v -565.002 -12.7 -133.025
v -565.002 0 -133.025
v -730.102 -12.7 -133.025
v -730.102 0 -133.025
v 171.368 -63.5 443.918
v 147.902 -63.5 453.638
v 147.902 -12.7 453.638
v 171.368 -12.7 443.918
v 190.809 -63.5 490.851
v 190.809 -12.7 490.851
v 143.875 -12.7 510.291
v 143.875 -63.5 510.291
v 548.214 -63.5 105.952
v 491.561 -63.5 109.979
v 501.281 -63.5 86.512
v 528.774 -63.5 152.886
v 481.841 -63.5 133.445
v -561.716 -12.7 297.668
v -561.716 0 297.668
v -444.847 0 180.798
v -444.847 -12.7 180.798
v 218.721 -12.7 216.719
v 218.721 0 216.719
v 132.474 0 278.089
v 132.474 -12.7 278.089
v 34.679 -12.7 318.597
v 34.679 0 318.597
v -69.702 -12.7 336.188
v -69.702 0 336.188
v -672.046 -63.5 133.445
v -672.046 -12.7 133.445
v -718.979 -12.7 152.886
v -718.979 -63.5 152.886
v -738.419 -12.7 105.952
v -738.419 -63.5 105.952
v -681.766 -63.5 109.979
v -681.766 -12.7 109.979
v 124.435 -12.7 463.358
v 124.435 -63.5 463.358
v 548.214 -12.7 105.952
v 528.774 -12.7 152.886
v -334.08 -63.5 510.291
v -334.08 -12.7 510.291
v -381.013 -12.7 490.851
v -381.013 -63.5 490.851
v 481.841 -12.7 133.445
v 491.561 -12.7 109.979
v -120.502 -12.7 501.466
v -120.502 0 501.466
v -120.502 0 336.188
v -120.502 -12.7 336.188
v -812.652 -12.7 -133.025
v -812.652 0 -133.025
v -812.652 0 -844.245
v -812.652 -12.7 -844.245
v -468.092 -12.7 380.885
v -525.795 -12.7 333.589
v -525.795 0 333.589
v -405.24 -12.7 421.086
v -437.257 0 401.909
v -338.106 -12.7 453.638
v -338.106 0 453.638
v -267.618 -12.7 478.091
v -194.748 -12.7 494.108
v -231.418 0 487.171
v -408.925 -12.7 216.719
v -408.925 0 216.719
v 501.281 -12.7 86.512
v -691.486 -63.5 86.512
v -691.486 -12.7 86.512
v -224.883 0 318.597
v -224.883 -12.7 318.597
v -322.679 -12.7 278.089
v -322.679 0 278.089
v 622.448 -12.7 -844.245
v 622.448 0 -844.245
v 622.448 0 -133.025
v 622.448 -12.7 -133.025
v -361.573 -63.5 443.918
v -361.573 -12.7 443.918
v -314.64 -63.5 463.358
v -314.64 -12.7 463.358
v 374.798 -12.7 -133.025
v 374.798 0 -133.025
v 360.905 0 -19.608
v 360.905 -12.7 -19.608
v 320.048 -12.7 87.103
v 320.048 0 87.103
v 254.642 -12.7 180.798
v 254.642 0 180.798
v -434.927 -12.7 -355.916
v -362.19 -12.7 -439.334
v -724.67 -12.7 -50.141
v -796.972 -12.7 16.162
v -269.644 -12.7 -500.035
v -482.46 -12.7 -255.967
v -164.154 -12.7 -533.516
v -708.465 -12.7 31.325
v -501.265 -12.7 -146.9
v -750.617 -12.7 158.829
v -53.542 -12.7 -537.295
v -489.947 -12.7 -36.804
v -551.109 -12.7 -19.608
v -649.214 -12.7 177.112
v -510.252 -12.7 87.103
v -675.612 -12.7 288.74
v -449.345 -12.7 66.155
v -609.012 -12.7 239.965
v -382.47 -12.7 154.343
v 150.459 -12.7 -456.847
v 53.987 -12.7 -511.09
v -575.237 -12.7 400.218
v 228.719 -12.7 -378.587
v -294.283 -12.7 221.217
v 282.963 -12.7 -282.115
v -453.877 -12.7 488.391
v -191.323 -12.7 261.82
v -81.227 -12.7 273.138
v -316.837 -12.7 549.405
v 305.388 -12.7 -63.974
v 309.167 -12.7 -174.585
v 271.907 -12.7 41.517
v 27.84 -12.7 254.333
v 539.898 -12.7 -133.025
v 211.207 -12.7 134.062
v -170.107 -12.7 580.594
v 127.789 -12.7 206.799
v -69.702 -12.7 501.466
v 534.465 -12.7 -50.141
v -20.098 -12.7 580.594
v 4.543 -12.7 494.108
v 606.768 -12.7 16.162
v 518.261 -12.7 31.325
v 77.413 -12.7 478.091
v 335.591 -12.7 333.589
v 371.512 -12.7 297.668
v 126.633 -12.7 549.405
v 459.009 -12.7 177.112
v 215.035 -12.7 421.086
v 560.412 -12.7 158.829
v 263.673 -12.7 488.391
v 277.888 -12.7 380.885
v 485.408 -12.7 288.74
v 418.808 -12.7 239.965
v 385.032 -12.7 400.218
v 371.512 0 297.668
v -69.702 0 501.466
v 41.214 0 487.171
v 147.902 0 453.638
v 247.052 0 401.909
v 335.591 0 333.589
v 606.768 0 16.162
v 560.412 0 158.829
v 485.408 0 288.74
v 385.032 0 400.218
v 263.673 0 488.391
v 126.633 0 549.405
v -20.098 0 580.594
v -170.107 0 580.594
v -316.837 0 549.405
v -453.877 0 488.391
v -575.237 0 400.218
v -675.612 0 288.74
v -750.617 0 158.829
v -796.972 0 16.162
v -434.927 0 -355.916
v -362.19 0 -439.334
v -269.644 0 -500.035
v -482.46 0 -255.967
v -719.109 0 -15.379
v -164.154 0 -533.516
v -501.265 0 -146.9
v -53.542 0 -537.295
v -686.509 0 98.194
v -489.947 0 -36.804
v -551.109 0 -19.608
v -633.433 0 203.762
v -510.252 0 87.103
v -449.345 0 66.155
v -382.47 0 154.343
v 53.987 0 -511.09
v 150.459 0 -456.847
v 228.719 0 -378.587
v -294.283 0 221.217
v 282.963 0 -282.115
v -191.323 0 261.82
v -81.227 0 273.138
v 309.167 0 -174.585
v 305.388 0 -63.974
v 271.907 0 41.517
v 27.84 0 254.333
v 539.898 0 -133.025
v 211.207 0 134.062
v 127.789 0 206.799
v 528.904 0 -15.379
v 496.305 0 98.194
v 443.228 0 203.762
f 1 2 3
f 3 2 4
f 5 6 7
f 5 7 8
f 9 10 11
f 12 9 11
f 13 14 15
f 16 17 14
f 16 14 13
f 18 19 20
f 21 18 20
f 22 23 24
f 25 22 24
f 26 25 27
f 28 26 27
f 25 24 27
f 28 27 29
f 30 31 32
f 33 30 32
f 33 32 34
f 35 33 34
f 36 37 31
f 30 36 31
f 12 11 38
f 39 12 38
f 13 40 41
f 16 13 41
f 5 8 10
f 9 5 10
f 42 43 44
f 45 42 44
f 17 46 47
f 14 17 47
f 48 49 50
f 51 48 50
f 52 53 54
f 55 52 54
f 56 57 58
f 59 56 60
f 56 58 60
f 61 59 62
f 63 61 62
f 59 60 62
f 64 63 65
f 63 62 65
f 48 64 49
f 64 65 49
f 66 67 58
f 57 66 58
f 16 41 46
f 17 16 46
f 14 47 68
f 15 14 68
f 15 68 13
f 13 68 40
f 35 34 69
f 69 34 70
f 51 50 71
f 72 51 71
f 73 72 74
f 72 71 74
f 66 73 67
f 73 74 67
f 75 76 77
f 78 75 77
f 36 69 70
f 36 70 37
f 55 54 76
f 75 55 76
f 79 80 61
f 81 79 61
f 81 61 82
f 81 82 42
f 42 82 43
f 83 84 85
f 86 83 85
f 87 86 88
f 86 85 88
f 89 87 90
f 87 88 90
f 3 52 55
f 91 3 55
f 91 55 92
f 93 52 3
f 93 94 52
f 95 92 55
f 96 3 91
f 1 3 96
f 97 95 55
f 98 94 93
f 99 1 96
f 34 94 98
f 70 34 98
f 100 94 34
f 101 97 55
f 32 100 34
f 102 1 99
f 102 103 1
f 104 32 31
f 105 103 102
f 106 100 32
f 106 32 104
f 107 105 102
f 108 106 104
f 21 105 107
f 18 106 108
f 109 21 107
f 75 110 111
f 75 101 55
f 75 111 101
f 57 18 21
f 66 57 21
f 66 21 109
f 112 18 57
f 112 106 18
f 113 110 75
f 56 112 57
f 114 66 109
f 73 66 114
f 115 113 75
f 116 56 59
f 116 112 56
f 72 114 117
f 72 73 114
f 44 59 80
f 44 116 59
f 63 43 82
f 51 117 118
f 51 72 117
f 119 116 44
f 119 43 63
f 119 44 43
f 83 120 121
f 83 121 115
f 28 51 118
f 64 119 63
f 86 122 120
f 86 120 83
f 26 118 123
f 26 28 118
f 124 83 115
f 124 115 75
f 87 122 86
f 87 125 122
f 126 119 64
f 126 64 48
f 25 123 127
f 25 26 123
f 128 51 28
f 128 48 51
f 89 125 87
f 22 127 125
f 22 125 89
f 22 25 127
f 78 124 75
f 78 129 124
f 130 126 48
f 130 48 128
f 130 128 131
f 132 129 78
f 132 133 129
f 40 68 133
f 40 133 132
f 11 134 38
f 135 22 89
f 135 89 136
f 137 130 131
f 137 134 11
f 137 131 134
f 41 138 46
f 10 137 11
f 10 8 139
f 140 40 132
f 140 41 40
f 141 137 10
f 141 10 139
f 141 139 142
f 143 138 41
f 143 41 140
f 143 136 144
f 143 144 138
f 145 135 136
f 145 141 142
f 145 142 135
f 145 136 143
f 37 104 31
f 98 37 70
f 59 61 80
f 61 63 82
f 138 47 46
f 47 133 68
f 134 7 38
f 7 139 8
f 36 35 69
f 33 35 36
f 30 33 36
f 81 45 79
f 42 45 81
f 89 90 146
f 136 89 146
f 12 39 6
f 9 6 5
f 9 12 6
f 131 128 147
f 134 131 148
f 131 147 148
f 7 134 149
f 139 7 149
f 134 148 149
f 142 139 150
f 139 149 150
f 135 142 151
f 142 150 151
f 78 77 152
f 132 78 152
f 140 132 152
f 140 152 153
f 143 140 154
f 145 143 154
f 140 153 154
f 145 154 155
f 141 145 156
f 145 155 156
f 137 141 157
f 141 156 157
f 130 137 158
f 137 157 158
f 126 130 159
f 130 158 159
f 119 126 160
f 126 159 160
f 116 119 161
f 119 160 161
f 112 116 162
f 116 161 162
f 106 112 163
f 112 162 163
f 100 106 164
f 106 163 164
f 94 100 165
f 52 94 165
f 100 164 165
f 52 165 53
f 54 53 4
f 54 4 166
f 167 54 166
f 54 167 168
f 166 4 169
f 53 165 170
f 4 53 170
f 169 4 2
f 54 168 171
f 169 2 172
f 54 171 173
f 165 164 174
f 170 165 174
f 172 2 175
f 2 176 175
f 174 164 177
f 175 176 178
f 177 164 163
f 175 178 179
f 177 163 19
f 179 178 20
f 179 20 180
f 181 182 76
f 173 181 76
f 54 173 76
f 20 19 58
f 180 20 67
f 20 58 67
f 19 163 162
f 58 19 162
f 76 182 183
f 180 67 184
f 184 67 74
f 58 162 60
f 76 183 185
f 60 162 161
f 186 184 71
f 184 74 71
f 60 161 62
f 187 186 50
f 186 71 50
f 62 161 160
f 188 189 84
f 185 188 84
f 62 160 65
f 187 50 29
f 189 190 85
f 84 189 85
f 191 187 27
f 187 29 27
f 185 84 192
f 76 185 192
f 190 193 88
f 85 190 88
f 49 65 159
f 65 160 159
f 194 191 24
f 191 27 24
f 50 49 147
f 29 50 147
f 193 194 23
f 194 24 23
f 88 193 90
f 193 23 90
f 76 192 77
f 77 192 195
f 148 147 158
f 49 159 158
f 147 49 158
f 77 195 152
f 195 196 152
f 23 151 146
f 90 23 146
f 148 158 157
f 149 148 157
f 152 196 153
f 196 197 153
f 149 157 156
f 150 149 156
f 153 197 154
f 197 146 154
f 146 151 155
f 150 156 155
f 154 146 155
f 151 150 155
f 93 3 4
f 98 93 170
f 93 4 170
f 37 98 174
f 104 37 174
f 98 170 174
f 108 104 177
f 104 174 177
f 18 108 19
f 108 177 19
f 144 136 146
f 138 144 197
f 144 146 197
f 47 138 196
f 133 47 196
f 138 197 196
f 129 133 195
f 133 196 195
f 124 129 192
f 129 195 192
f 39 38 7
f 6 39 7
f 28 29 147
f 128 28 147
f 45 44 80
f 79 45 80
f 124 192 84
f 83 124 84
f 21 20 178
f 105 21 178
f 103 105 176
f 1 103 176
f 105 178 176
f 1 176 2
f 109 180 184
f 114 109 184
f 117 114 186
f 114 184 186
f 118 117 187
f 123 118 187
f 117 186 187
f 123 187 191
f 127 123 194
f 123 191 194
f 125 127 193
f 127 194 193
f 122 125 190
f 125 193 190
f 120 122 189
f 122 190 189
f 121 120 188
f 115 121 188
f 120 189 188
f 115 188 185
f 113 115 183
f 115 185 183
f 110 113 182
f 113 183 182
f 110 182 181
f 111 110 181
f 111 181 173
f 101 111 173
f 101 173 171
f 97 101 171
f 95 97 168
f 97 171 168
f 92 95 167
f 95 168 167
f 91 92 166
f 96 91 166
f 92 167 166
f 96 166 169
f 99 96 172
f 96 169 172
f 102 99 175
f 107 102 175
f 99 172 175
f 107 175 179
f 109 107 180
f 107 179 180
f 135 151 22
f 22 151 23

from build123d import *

# Parameters (mm, degrees)
F1_DEPTH = 12.7
F3_DEPTH = 50.8


# Not quite as in the source:
# - a feature names something its author has since deleted; it is built from what else it names


with BuildPart() as f1:
    # F0 (on Front) → F1 (new body)
    with BuildSketch(Plane.XZ):
        with BuildLine():
            ThreePointArc((-95.1022987413, 273.3746719669), (60.4202481719, 242.4393139794), (192.265897133, 154.3428678411))
            Line((192.265897133, 154.3428678411), (412.2821720991, 374.3591428073))
            ThreePointArc((412.2821720992, 374.3591428073), (-95.1022987413, 584.5246719669), (-602.4867695817, 374.3591428072))
            Line((-602.4867695817, 374.3591428073), (-382.4704946155, 154.3428678411))
            ThreePointArc((-382.4704946155, 154.3428678411), (-250.6248456544, 242.4393139794), (-95.1022987413, 273.3746719669))
        make_face()
        with BuildLine():
            ThreePointArc((-525.7952385086, 333.5886362184), (-338.1062782931, 453.6381751115), (-120.5022987413, 501.4664686041))
            Line((-120.5022987413, 501.4664686041), (-120.5022987413, 336.1876832954))
            ThreePointArc((-120.5022987413, 336.1876832954), (-274.9252436096, 301.1056642939), (-408.9254886305, 216.7188863404))
            Line((-408.9254886305, 216.7188863404), (-525.7952385086, 333.5886362184))
        make_face(mode=Mode.SUBTRACT)
        with BuildLine():
            Line((-69.7022987413, 336.1876832954), (-69.7022987413, 501.4664686041))
            ThreePointArc((-69.7022987413, 501.4664686041), (147.9016808106, 453.6381751115), (335.5906410261, 333.5886362184))
            Line((335.5906410261, 333.5886362184), (218.720891148, 216.7188863404))
            ThreePointArc((218.720891148, 216.7188863404), (84.7206461271, 301.1056642939), (-69.7022987413, 336.1876832954))
        make_face(mode=Mode.SUBTRACT)
        with BuildLine():
            ThreePointArc((192.265897133, 154.3428678411), (280.3623432713, 22.49721888), (311.2977012587, -133.0253280331))
            ThreePointArc((311.2977012587, -133.0253280331), (-250.6248456544, -508.4899700457), (-382.4704946155, 154.3428678411))
            Line((-382.4704946155, 154.3428678411), (-602.4867695817, 374.3591428073))
            ThreePointArc((-602.4867695817, 374.3591428072), (-758.0320572947, 141.5691688604), (-812.6522987413, -133.0253280331))
            Line((-812.6522987413, -133.0253280331), (-812.6522987413, -844.2450938398))
            Line((-812.6522987413, -844.2450938398), (0, -844.2450938398))
            Line((0, -844.2450938398), (622.4477012587, -844.2450938398))
            Line((622.4477012587, -844.2450938398), (622.4477012587, -133.0253280331))
            ThreePointArc((622.4477012587, -133.0253280331), (567.8274598122, 141.5691688604), (412.2821720992, 374.3591428073))
            Line((412.2821720991, 374.3591428073), (192.265897133, 154.3428678411))
        make_face()
        with BuildLine():
            ThreePointArc((-444.8465131148, 180.7978618561), (-533.9364452785, 34.9943191303), (-565.0022987413, -133.0253280331))
            Line((-565.0022987413, -133.0253280331), (-730.1022987413, -133.0253280331))
            ThreePointArc((-730.1022987413, -133.0253280331), (-686.5094627576, 98.1944080408), (-561.7162629929, 297.6676117342))
            Line((-561.7162629929, 297.6676117342), (-444.8465131148, 180.7978618561))
        make_face(mode=Mode.SUBTRACT)
        with BuildLine():
            ThreePointArc((371.5116655103, 297.6676117342), (496.3048652751, 98.1944080408), (539.8977012587, -133.0253280331))
            Line((539.8977012587, -133.0253280331), (374.7977012587, -133.0253280331))
            ThreePointArc((374.7977012587, -133.0253280331), (343.731847796, 34.9943191303), (254.6419156323, 180.7978618561))
            Line((254.6419156323, 180.7978618561), (371.5116655103, 297.6676117342))
        make_face(mode=Mode.SUBTRACT)
    extrude(amount=F1_DEPTH)

    # F2 (on face) → F3 (join)
    with BuildSketch(Plane.XZ.offset(12.7)):
        Polygon((-691.485961068, 86.5121113929), (-681.7658018859, 109.9786515187), (-672.0456427039, 133.4451916445), (-718.9787229554, 152.8855100086), (-738.4190413196, 105.952429757), align=None)
        Polygon((528.7741254729, 152.8855100086), (481.8410452213, 133.4451916445), (491.5612025764, 109.9786559296), (501.2813635855, 86.5121113929), (548.2144438371, 105.952429757), align=None)
        Polygon((-381.013136783, 490.851096181), (-361.5728184189, 443.9180159294), (-338.1062857272, 453.6381720322), (-314.6397381673, 463.3583342936), (-334.0800565315, 510.2914145452), align=None)
        Polygon((143.8754590489, 510.2914145452), (124.4351406848, 463.3583342936), (147.9016748411, 453.6381775841), (171.3682209364, 443.9180159294), (190.8085393005, 490.851096181), align=None)
    extrude(amount=F3_DEPTH)


solid = f1.part
